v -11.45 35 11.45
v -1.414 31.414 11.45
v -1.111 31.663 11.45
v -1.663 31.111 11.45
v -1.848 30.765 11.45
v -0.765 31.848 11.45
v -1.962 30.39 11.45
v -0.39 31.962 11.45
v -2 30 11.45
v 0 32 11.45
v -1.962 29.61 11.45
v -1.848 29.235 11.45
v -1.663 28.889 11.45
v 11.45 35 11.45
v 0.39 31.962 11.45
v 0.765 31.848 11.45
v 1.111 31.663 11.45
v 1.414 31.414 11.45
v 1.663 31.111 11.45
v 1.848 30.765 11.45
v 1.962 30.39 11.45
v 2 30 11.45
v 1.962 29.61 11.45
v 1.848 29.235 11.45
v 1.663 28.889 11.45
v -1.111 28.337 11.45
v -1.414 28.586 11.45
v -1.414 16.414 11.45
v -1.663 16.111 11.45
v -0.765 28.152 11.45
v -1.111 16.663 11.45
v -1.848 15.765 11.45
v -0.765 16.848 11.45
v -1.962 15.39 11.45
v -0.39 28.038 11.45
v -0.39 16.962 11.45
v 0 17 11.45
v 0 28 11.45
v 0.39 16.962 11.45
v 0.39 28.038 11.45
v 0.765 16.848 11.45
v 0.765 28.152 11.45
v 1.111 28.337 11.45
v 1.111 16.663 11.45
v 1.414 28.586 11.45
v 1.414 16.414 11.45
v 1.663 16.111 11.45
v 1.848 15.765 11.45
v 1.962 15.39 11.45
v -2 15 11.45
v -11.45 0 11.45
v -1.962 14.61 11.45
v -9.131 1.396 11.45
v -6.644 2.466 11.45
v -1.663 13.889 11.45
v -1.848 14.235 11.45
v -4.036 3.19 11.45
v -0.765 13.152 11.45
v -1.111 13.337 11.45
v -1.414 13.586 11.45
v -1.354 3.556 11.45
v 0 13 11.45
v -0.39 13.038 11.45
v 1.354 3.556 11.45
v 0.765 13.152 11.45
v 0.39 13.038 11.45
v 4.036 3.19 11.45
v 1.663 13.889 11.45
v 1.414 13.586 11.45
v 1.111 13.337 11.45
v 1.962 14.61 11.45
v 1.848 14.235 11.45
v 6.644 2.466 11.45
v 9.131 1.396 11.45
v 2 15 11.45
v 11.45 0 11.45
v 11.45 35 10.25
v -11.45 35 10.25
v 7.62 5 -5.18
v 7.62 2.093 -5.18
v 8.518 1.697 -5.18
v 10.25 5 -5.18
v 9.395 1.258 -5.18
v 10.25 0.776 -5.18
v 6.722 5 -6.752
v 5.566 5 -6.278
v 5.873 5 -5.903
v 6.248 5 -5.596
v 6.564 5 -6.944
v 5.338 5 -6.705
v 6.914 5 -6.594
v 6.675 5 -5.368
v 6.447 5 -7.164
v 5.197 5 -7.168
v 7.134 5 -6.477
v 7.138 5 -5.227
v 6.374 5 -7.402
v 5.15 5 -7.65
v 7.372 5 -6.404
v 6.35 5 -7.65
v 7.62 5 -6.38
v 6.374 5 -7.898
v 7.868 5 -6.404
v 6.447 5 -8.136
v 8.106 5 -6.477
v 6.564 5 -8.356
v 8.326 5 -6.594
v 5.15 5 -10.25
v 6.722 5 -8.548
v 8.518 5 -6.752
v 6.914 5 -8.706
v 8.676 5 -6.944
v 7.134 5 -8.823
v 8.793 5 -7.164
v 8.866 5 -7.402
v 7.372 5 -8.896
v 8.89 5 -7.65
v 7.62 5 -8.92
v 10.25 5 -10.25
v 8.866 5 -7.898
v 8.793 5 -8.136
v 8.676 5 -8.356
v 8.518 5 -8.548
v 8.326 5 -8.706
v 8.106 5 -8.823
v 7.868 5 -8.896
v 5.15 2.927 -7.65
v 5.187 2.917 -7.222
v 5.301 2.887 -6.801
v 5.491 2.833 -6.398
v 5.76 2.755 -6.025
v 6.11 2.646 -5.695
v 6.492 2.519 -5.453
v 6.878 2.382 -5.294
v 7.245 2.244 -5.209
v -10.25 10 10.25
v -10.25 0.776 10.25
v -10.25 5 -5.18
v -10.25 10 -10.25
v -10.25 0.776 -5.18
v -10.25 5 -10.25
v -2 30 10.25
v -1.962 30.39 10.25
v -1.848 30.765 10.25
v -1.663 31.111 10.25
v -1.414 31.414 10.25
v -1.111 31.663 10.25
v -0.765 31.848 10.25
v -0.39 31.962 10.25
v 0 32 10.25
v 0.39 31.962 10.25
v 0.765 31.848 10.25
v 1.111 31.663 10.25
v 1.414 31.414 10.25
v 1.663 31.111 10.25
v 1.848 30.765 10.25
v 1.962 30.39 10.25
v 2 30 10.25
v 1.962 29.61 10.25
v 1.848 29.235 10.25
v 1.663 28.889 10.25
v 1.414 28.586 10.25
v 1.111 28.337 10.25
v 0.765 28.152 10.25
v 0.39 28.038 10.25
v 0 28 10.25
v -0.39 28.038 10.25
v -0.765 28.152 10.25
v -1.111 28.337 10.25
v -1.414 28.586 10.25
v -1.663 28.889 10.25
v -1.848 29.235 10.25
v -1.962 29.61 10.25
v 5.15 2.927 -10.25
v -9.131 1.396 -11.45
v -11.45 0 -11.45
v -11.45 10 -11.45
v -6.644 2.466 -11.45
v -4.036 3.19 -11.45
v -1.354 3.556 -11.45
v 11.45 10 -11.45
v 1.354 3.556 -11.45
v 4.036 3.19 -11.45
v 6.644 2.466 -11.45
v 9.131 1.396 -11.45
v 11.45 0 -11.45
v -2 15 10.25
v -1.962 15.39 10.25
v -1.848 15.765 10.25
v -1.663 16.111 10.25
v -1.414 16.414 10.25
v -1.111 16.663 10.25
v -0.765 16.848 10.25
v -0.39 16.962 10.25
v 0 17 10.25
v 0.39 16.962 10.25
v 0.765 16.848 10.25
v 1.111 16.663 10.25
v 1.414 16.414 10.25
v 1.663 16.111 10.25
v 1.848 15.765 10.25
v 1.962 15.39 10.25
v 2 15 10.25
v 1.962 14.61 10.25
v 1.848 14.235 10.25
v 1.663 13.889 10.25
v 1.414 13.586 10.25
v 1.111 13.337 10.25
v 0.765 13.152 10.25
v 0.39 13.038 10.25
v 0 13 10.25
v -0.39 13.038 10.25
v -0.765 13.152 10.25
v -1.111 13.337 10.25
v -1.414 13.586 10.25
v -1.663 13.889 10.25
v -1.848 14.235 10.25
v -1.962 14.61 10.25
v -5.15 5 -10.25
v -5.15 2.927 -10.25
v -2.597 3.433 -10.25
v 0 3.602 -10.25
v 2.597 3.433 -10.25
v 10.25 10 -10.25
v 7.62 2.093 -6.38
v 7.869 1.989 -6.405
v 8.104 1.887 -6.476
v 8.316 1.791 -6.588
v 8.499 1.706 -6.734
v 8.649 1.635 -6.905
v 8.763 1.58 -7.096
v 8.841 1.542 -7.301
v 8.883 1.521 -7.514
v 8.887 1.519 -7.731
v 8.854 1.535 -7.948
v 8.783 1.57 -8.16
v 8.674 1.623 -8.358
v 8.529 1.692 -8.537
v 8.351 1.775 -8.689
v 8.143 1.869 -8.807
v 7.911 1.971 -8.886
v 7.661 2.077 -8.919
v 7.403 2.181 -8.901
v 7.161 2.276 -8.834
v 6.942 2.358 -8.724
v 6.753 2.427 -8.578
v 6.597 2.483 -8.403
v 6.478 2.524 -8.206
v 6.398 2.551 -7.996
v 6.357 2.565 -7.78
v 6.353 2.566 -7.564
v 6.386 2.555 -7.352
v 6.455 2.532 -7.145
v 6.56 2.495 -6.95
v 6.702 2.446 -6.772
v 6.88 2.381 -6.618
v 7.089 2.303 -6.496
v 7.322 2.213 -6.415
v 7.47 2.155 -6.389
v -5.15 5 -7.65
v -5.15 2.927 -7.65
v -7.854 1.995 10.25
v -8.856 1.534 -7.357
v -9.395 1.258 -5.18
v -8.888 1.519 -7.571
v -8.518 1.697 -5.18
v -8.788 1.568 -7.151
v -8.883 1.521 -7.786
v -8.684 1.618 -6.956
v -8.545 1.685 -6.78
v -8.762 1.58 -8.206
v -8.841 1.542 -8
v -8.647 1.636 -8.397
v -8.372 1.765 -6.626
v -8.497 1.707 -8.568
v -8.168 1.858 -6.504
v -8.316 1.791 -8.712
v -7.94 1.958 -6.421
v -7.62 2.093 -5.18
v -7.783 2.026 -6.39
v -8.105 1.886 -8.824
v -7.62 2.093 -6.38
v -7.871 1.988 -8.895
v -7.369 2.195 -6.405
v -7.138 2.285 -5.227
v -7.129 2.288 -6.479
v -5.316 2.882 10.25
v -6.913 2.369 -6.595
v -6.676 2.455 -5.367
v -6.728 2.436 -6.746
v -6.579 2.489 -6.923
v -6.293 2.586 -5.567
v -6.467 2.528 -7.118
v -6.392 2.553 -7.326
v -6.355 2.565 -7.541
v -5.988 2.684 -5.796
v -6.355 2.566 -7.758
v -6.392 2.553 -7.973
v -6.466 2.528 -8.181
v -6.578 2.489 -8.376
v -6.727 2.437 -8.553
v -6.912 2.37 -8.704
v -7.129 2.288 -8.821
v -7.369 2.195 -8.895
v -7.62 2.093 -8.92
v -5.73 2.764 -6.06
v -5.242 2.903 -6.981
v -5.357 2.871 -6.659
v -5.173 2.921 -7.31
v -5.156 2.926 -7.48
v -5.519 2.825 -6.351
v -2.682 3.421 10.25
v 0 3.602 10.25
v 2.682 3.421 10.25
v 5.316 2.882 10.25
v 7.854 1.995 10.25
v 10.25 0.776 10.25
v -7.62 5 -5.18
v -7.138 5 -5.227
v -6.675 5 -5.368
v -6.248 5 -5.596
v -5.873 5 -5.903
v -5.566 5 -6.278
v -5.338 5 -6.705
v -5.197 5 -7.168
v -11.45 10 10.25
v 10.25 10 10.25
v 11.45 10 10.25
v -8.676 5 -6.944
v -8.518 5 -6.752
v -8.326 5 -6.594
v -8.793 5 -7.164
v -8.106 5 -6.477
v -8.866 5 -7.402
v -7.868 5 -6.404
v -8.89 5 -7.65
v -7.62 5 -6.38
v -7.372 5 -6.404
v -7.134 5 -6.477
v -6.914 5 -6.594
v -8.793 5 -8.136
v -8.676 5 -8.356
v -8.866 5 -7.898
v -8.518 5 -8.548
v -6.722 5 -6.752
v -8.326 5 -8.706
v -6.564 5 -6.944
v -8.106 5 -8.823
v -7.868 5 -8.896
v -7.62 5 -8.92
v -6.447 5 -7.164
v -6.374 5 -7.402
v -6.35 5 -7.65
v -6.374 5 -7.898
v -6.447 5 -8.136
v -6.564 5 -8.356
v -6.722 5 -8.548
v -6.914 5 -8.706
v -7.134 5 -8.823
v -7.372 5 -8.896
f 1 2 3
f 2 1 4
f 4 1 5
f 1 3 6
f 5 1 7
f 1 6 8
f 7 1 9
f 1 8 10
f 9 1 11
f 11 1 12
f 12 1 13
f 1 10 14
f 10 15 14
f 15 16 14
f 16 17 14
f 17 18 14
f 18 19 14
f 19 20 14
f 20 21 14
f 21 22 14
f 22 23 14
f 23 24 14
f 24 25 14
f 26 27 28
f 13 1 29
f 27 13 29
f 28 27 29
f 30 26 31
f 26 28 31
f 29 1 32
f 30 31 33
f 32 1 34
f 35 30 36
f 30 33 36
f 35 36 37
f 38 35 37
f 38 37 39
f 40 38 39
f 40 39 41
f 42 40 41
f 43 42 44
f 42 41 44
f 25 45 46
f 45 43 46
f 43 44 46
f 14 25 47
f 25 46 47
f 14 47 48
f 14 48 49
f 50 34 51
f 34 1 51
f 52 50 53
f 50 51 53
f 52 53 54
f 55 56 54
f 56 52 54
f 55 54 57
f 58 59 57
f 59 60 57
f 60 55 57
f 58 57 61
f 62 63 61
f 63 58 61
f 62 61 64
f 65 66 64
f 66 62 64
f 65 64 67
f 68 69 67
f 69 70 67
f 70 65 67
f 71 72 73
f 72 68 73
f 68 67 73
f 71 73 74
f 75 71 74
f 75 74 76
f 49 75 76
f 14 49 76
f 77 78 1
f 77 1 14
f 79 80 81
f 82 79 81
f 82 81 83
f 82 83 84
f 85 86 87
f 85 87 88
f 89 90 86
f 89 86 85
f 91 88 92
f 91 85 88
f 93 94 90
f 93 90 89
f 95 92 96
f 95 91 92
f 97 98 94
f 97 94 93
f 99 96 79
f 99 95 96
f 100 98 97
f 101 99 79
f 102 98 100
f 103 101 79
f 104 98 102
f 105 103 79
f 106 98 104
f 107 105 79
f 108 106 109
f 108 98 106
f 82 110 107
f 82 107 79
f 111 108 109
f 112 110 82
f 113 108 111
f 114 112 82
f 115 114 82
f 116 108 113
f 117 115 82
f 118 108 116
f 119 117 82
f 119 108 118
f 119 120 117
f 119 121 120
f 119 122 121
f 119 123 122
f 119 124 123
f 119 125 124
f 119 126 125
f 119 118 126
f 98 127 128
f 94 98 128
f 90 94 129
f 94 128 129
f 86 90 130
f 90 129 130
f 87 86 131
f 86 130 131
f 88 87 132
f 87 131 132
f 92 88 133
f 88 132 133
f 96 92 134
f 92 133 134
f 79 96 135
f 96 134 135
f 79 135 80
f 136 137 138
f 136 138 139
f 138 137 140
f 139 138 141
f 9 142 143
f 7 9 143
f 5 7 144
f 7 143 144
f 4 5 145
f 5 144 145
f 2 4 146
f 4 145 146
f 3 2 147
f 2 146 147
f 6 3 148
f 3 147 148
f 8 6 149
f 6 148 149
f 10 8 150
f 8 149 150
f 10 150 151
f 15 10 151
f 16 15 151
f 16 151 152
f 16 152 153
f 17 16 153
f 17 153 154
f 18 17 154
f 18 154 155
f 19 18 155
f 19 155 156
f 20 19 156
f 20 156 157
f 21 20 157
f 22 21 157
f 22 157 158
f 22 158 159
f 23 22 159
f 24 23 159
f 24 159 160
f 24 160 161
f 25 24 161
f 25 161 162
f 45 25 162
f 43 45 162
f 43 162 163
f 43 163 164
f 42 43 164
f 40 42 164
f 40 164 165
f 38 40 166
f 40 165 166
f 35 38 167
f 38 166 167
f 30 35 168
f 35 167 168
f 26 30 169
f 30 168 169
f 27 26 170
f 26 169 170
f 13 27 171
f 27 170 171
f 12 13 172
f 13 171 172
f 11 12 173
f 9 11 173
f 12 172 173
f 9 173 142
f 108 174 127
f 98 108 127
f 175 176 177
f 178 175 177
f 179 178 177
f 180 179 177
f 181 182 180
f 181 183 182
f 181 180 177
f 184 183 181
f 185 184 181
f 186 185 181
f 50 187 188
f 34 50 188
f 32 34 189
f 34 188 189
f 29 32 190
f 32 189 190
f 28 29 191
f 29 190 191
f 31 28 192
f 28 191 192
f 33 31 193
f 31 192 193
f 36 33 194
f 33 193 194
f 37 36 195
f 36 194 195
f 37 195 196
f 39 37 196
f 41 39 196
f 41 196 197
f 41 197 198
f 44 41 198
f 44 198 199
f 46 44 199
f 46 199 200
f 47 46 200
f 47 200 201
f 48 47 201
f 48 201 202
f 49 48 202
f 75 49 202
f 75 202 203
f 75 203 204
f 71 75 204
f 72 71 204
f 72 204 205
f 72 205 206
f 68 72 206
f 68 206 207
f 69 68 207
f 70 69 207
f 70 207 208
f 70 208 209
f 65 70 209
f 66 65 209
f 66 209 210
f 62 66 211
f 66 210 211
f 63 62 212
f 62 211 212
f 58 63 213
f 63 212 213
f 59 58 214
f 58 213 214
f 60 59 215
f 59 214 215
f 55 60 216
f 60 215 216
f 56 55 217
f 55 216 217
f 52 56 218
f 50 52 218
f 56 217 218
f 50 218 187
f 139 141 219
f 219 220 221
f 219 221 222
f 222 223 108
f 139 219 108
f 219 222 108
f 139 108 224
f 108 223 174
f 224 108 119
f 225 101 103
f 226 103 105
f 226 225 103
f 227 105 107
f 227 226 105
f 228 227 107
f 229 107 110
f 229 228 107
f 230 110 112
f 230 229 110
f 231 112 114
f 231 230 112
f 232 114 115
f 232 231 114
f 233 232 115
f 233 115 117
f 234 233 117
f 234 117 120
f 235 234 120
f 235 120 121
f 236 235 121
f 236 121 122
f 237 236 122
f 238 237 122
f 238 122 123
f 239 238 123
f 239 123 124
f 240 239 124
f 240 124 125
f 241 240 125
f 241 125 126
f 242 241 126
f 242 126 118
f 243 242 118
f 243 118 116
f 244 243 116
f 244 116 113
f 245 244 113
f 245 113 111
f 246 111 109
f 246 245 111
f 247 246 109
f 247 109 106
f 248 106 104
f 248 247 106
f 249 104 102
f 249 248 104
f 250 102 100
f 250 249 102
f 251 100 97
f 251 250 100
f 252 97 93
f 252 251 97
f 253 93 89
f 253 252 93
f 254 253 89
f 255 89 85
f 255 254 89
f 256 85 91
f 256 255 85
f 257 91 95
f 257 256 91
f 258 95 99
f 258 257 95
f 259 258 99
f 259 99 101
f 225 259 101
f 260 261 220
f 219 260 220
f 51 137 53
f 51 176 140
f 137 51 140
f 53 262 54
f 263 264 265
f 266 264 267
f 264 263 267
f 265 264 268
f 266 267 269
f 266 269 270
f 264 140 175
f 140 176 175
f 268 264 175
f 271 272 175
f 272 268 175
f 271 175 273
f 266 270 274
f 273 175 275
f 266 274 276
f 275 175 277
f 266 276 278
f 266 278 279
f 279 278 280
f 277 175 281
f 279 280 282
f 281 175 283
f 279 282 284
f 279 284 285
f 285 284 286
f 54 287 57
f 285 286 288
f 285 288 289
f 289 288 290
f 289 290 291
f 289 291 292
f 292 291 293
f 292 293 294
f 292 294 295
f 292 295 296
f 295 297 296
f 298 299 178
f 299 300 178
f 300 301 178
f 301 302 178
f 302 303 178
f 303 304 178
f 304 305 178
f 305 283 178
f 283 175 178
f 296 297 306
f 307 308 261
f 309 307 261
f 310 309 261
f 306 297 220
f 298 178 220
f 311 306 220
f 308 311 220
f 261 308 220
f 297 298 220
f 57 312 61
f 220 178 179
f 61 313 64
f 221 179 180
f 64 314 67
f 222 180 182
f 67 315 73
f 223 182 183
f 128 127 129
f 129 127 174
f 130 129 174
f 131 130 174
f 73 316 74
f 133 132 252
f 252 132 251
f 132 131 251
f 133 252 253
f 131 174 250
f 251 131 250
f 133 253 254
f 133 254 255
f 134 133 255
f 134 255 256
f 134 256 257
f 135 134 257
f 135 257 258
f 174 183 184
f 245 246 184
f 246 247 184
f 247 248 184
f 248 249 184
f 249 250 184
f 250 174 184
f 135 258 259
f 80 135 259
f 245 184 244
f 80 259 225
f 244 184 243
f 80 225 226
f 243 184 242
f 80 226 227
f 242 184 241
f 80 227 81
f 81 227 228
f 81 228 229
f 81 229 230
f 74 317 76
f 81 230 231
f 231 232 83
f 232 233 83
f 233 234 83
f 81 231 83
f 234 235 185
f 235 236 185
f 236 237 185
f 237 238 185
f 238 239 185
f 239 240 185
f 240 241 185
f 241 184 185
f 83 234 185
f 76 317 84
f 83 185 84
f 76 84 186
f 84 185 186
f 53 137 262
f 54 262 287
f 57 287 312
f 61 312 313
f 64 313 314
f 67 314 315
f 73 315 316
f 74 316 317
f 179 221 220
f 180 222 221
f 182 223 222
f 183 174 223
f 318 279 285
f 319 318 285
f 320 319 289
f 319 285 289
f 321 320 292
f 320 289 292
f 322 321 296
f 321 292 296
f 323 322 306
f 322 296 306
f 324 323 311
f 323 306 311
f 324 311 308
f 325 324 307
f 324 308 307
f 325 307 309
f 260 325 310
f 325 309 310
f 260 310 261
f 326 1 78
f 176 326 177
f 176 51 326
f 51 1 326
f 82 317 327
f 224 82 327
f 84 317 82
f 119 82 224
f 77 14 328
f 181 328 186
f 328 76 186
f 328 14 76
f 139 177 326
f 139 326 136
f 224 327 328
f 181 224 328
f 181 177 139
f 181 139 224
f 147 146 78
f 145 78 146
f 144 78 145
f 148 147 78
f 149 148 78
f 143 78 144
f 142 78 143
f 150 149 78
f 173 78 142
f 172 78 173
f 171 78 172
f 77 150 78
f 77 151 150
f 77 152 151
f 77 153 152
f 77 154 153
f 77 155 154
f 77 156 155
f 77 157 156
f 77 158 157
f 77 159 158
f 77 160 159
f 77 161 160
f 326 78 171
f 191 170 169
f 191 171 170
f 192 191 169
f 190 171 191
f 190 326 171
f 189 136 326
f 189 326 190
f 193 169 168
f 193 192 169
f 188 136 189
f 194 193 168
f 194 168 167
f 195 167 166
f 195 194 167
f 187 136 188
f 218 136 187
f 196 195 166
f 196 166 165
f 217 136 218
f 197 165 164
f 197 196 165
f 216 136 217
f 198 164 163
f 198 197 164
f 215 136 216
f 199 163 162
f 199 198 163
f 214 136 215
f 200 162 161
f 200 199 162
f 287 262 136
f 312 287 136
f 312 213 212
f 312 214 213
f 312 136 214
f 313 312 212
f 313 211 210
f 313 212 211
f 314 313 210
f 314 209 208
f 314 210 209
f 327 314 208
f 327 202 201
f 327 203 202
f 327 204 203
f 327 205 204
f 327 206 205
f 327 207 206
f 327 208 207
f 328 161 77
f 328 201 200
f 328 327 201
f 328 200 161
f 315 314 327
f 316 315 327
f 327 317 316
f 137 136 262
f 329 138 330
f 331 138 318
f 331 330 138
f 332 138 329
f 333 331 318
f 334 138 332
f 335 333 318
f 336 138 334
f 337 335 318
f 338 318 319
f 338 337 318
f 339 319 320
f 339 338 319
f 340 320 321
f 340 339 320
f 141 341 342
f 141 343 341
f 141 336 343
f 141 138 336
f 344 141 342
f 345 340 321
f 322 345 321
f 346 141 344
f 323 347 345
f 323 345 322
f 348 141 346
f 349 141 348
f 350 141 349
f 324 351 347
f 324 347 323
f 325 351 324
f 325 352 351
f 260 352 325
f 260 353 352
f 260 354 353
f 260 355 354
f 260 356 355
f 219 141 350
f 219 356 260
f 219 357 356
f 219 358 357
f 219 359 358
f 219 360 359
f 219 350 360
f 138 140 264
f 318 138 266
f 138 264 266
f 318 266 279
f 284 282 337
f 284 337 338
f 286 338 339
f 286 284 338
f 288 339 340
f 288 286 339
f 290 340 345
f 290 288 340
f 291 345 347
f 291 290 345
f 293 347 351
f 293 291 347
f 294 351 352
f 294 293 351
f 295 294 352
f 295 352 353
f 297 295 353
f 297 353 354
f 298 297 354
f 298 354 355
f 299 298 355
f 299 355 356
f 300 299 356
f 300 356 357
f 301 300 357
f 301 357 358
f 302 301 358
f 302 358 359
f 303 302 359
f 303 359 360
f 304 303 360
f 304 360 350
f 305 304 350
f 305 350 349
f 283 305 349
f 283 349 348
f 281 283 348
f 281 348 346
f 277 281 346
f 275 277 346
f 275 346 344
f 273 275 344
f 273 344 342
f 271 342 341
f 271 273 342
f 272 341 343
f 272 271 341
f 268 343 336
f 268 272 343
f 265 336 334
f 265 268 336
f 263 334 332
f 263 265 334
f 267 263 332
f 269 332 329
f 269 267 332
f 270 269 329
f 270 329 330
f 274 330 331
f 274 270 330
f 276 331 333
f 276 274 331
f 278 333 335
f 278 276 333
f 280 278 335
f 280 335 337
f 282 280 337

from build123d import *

# Parameters (mm, degrees)
SKETCH_1_W          = 22.9
SKETCH_1_H          = 22.9
SKETCH_1_W_2        = 20.5
SKETCH_1_H_2        = 20.5
EXTRUDE_1_DEPTH     = 10
SKETCH_1_4_R        = 1.27
EXTRUDE_2_DEPTH     = 5
EXTRUDE_3_DEPTH     = 10
SKETCH_3_W          = 22.9
SKETCH_3_H          = 1.2
EXTRUDE_4_DEPTH     = 25
CUT_EXTRUDE_1_REACH = 45.365
SKETCH_4_R          = 20
SKETCH_5_R          = 2
CUT_EXTRUDE_2_DEPTH = 43.743332891


with BuildPart() as part:
    # 草图1 → 凸台-拉伸1 (new body)
    with BuildSketch(Plane(origin=(0, 0, 0), x_dir=(1, 0, 0), z_dir=(0, 1, 0))):
        Rectangle(SKETCH_1_W, SKETCH_1_H)
        Rectangle(SKETCH_1_W_2, SKETCH_1_H_2, mode=Mode.SUBTRACT)
    extrude(amount=EXTRUDE_1_DEPTH)

    # 草图1<4> → 凸台-拉伸2 (add)
    # profile 1 of 2: a face of its own
    with BuildSketch(Plane(origin=(0, 0, 0), x_dir=(1, 0, 0), z_dir=(0, 1, 0))):
        with BuildLine():
            Line((-5.15, 10.25), (-10.25, 10.25))
            Line((-10.25, 10.25), (-10.25, 5.18))
            Line((-10.25, 5.18), (-7.62, 5.18))
            ThreePointArc((-7.62, 5.18), (-5.87344625, 5.90344625), (-5.15, 7.65))
            Line((-5.15, 7.65), (-5.15, 10.25))
        make_face()
        with Locations((-7.62, 7.65)):
            Circle(SKETCH_1_4_R, mode=Mode.SUBTRACT)
    # profile 2 of 2: a face of its own
    with BuildSketch(Plane(origin=(0, 0, 0), x_dir=(1, 0, 0), z_dir=(0, 1, 0))):
        with BuildLine():
            Line((10.25, 10.25), (5.15, 10.25))
            Line((5.15, 10.25), (5.15, 7.65))
            ThreePointArc((5.15, 7.65), (5.87344625, 5.90344625), (7.62, 5.18))
            Line((7.62, 5.18), (10.25, 5.18))
            Line((10.25, 5.18), (10.25, 10.25))
        make_face()
        with Locations((7.62, 7.65)):
            Circle(SKETCH_1_4_R, mode=Mode.SUBTRACT)
    extrude(amount=EXTRUDE_2_DEPTH)

    # 草图1<5> → 凸台-拉伸3 (add)
    with BuildSketch(Plane(origin=(0, 0, 0), x_dir=(1, 0, 0), z_dir=(0, 1, 0))):
        Polygon((10.25, -10.25), (-10.25, -10.25), (-11.45, -10.25), (-11.45, -11.45), (11.45, -11.45), (11.45, -10.25), align=None)
    extrude(amount=EXTRUDE_3_DEPTH)

    # 草图3 → 凸台-拉伸4 (add)
    with BuildSketch(Plane(origin=(0, 10, 0), x_dir=(1, 0, 0), z_dir=(0, 1, 0))):
        with Locations((0, -10.85)):
            Rectangle(SKETCH_3_W, SKETCH_3_H)
    extrude(amount=EXTRUDE_4_DEPTH)

    # 草图4 → 切除-拉伸1 (cut, up to next)
    with BuildSketch(Plane(origin=(0, 0, -11.45), x_dir=(-1, 0, 0), z_dir=(0, 0, -1)), mode=Mode.PRIVATE) as cut_extrude_1_sk1:
        with Locations((0, -16.398094401)):
            Circle(SKETCH_4_R)
    cut_extrude_1_tool1 = extrude(cut_extrude_1_sk1.sketch, amount=-CUT_EXTRUDE_1_REACH, mode=Mode.PRIVATE) & part.part
    add(cut_extrude_1_tool1.solids().sort_by_distance((0, -16.398094, -11.45))[0], mode=Mode.SUBTRACT)

    # 草图5 → 切除-拉伸2 (cut, through all)
    with BuildSketch(Plane(origin=(0, 0, 10.25), x_dir=(-1, 0, 0), z_dir=(0, 0, -1))):
        with Locations((0, 15)):
            Circle(SKETCH_5_R)
        with Locations((0, 30)):
            Circle(SKETCH_5_R)
    extrude(amount=-CUT_EXTRUDE_2_DEPTH, mode=Mode.SUBTRACT)


solid = part.part
